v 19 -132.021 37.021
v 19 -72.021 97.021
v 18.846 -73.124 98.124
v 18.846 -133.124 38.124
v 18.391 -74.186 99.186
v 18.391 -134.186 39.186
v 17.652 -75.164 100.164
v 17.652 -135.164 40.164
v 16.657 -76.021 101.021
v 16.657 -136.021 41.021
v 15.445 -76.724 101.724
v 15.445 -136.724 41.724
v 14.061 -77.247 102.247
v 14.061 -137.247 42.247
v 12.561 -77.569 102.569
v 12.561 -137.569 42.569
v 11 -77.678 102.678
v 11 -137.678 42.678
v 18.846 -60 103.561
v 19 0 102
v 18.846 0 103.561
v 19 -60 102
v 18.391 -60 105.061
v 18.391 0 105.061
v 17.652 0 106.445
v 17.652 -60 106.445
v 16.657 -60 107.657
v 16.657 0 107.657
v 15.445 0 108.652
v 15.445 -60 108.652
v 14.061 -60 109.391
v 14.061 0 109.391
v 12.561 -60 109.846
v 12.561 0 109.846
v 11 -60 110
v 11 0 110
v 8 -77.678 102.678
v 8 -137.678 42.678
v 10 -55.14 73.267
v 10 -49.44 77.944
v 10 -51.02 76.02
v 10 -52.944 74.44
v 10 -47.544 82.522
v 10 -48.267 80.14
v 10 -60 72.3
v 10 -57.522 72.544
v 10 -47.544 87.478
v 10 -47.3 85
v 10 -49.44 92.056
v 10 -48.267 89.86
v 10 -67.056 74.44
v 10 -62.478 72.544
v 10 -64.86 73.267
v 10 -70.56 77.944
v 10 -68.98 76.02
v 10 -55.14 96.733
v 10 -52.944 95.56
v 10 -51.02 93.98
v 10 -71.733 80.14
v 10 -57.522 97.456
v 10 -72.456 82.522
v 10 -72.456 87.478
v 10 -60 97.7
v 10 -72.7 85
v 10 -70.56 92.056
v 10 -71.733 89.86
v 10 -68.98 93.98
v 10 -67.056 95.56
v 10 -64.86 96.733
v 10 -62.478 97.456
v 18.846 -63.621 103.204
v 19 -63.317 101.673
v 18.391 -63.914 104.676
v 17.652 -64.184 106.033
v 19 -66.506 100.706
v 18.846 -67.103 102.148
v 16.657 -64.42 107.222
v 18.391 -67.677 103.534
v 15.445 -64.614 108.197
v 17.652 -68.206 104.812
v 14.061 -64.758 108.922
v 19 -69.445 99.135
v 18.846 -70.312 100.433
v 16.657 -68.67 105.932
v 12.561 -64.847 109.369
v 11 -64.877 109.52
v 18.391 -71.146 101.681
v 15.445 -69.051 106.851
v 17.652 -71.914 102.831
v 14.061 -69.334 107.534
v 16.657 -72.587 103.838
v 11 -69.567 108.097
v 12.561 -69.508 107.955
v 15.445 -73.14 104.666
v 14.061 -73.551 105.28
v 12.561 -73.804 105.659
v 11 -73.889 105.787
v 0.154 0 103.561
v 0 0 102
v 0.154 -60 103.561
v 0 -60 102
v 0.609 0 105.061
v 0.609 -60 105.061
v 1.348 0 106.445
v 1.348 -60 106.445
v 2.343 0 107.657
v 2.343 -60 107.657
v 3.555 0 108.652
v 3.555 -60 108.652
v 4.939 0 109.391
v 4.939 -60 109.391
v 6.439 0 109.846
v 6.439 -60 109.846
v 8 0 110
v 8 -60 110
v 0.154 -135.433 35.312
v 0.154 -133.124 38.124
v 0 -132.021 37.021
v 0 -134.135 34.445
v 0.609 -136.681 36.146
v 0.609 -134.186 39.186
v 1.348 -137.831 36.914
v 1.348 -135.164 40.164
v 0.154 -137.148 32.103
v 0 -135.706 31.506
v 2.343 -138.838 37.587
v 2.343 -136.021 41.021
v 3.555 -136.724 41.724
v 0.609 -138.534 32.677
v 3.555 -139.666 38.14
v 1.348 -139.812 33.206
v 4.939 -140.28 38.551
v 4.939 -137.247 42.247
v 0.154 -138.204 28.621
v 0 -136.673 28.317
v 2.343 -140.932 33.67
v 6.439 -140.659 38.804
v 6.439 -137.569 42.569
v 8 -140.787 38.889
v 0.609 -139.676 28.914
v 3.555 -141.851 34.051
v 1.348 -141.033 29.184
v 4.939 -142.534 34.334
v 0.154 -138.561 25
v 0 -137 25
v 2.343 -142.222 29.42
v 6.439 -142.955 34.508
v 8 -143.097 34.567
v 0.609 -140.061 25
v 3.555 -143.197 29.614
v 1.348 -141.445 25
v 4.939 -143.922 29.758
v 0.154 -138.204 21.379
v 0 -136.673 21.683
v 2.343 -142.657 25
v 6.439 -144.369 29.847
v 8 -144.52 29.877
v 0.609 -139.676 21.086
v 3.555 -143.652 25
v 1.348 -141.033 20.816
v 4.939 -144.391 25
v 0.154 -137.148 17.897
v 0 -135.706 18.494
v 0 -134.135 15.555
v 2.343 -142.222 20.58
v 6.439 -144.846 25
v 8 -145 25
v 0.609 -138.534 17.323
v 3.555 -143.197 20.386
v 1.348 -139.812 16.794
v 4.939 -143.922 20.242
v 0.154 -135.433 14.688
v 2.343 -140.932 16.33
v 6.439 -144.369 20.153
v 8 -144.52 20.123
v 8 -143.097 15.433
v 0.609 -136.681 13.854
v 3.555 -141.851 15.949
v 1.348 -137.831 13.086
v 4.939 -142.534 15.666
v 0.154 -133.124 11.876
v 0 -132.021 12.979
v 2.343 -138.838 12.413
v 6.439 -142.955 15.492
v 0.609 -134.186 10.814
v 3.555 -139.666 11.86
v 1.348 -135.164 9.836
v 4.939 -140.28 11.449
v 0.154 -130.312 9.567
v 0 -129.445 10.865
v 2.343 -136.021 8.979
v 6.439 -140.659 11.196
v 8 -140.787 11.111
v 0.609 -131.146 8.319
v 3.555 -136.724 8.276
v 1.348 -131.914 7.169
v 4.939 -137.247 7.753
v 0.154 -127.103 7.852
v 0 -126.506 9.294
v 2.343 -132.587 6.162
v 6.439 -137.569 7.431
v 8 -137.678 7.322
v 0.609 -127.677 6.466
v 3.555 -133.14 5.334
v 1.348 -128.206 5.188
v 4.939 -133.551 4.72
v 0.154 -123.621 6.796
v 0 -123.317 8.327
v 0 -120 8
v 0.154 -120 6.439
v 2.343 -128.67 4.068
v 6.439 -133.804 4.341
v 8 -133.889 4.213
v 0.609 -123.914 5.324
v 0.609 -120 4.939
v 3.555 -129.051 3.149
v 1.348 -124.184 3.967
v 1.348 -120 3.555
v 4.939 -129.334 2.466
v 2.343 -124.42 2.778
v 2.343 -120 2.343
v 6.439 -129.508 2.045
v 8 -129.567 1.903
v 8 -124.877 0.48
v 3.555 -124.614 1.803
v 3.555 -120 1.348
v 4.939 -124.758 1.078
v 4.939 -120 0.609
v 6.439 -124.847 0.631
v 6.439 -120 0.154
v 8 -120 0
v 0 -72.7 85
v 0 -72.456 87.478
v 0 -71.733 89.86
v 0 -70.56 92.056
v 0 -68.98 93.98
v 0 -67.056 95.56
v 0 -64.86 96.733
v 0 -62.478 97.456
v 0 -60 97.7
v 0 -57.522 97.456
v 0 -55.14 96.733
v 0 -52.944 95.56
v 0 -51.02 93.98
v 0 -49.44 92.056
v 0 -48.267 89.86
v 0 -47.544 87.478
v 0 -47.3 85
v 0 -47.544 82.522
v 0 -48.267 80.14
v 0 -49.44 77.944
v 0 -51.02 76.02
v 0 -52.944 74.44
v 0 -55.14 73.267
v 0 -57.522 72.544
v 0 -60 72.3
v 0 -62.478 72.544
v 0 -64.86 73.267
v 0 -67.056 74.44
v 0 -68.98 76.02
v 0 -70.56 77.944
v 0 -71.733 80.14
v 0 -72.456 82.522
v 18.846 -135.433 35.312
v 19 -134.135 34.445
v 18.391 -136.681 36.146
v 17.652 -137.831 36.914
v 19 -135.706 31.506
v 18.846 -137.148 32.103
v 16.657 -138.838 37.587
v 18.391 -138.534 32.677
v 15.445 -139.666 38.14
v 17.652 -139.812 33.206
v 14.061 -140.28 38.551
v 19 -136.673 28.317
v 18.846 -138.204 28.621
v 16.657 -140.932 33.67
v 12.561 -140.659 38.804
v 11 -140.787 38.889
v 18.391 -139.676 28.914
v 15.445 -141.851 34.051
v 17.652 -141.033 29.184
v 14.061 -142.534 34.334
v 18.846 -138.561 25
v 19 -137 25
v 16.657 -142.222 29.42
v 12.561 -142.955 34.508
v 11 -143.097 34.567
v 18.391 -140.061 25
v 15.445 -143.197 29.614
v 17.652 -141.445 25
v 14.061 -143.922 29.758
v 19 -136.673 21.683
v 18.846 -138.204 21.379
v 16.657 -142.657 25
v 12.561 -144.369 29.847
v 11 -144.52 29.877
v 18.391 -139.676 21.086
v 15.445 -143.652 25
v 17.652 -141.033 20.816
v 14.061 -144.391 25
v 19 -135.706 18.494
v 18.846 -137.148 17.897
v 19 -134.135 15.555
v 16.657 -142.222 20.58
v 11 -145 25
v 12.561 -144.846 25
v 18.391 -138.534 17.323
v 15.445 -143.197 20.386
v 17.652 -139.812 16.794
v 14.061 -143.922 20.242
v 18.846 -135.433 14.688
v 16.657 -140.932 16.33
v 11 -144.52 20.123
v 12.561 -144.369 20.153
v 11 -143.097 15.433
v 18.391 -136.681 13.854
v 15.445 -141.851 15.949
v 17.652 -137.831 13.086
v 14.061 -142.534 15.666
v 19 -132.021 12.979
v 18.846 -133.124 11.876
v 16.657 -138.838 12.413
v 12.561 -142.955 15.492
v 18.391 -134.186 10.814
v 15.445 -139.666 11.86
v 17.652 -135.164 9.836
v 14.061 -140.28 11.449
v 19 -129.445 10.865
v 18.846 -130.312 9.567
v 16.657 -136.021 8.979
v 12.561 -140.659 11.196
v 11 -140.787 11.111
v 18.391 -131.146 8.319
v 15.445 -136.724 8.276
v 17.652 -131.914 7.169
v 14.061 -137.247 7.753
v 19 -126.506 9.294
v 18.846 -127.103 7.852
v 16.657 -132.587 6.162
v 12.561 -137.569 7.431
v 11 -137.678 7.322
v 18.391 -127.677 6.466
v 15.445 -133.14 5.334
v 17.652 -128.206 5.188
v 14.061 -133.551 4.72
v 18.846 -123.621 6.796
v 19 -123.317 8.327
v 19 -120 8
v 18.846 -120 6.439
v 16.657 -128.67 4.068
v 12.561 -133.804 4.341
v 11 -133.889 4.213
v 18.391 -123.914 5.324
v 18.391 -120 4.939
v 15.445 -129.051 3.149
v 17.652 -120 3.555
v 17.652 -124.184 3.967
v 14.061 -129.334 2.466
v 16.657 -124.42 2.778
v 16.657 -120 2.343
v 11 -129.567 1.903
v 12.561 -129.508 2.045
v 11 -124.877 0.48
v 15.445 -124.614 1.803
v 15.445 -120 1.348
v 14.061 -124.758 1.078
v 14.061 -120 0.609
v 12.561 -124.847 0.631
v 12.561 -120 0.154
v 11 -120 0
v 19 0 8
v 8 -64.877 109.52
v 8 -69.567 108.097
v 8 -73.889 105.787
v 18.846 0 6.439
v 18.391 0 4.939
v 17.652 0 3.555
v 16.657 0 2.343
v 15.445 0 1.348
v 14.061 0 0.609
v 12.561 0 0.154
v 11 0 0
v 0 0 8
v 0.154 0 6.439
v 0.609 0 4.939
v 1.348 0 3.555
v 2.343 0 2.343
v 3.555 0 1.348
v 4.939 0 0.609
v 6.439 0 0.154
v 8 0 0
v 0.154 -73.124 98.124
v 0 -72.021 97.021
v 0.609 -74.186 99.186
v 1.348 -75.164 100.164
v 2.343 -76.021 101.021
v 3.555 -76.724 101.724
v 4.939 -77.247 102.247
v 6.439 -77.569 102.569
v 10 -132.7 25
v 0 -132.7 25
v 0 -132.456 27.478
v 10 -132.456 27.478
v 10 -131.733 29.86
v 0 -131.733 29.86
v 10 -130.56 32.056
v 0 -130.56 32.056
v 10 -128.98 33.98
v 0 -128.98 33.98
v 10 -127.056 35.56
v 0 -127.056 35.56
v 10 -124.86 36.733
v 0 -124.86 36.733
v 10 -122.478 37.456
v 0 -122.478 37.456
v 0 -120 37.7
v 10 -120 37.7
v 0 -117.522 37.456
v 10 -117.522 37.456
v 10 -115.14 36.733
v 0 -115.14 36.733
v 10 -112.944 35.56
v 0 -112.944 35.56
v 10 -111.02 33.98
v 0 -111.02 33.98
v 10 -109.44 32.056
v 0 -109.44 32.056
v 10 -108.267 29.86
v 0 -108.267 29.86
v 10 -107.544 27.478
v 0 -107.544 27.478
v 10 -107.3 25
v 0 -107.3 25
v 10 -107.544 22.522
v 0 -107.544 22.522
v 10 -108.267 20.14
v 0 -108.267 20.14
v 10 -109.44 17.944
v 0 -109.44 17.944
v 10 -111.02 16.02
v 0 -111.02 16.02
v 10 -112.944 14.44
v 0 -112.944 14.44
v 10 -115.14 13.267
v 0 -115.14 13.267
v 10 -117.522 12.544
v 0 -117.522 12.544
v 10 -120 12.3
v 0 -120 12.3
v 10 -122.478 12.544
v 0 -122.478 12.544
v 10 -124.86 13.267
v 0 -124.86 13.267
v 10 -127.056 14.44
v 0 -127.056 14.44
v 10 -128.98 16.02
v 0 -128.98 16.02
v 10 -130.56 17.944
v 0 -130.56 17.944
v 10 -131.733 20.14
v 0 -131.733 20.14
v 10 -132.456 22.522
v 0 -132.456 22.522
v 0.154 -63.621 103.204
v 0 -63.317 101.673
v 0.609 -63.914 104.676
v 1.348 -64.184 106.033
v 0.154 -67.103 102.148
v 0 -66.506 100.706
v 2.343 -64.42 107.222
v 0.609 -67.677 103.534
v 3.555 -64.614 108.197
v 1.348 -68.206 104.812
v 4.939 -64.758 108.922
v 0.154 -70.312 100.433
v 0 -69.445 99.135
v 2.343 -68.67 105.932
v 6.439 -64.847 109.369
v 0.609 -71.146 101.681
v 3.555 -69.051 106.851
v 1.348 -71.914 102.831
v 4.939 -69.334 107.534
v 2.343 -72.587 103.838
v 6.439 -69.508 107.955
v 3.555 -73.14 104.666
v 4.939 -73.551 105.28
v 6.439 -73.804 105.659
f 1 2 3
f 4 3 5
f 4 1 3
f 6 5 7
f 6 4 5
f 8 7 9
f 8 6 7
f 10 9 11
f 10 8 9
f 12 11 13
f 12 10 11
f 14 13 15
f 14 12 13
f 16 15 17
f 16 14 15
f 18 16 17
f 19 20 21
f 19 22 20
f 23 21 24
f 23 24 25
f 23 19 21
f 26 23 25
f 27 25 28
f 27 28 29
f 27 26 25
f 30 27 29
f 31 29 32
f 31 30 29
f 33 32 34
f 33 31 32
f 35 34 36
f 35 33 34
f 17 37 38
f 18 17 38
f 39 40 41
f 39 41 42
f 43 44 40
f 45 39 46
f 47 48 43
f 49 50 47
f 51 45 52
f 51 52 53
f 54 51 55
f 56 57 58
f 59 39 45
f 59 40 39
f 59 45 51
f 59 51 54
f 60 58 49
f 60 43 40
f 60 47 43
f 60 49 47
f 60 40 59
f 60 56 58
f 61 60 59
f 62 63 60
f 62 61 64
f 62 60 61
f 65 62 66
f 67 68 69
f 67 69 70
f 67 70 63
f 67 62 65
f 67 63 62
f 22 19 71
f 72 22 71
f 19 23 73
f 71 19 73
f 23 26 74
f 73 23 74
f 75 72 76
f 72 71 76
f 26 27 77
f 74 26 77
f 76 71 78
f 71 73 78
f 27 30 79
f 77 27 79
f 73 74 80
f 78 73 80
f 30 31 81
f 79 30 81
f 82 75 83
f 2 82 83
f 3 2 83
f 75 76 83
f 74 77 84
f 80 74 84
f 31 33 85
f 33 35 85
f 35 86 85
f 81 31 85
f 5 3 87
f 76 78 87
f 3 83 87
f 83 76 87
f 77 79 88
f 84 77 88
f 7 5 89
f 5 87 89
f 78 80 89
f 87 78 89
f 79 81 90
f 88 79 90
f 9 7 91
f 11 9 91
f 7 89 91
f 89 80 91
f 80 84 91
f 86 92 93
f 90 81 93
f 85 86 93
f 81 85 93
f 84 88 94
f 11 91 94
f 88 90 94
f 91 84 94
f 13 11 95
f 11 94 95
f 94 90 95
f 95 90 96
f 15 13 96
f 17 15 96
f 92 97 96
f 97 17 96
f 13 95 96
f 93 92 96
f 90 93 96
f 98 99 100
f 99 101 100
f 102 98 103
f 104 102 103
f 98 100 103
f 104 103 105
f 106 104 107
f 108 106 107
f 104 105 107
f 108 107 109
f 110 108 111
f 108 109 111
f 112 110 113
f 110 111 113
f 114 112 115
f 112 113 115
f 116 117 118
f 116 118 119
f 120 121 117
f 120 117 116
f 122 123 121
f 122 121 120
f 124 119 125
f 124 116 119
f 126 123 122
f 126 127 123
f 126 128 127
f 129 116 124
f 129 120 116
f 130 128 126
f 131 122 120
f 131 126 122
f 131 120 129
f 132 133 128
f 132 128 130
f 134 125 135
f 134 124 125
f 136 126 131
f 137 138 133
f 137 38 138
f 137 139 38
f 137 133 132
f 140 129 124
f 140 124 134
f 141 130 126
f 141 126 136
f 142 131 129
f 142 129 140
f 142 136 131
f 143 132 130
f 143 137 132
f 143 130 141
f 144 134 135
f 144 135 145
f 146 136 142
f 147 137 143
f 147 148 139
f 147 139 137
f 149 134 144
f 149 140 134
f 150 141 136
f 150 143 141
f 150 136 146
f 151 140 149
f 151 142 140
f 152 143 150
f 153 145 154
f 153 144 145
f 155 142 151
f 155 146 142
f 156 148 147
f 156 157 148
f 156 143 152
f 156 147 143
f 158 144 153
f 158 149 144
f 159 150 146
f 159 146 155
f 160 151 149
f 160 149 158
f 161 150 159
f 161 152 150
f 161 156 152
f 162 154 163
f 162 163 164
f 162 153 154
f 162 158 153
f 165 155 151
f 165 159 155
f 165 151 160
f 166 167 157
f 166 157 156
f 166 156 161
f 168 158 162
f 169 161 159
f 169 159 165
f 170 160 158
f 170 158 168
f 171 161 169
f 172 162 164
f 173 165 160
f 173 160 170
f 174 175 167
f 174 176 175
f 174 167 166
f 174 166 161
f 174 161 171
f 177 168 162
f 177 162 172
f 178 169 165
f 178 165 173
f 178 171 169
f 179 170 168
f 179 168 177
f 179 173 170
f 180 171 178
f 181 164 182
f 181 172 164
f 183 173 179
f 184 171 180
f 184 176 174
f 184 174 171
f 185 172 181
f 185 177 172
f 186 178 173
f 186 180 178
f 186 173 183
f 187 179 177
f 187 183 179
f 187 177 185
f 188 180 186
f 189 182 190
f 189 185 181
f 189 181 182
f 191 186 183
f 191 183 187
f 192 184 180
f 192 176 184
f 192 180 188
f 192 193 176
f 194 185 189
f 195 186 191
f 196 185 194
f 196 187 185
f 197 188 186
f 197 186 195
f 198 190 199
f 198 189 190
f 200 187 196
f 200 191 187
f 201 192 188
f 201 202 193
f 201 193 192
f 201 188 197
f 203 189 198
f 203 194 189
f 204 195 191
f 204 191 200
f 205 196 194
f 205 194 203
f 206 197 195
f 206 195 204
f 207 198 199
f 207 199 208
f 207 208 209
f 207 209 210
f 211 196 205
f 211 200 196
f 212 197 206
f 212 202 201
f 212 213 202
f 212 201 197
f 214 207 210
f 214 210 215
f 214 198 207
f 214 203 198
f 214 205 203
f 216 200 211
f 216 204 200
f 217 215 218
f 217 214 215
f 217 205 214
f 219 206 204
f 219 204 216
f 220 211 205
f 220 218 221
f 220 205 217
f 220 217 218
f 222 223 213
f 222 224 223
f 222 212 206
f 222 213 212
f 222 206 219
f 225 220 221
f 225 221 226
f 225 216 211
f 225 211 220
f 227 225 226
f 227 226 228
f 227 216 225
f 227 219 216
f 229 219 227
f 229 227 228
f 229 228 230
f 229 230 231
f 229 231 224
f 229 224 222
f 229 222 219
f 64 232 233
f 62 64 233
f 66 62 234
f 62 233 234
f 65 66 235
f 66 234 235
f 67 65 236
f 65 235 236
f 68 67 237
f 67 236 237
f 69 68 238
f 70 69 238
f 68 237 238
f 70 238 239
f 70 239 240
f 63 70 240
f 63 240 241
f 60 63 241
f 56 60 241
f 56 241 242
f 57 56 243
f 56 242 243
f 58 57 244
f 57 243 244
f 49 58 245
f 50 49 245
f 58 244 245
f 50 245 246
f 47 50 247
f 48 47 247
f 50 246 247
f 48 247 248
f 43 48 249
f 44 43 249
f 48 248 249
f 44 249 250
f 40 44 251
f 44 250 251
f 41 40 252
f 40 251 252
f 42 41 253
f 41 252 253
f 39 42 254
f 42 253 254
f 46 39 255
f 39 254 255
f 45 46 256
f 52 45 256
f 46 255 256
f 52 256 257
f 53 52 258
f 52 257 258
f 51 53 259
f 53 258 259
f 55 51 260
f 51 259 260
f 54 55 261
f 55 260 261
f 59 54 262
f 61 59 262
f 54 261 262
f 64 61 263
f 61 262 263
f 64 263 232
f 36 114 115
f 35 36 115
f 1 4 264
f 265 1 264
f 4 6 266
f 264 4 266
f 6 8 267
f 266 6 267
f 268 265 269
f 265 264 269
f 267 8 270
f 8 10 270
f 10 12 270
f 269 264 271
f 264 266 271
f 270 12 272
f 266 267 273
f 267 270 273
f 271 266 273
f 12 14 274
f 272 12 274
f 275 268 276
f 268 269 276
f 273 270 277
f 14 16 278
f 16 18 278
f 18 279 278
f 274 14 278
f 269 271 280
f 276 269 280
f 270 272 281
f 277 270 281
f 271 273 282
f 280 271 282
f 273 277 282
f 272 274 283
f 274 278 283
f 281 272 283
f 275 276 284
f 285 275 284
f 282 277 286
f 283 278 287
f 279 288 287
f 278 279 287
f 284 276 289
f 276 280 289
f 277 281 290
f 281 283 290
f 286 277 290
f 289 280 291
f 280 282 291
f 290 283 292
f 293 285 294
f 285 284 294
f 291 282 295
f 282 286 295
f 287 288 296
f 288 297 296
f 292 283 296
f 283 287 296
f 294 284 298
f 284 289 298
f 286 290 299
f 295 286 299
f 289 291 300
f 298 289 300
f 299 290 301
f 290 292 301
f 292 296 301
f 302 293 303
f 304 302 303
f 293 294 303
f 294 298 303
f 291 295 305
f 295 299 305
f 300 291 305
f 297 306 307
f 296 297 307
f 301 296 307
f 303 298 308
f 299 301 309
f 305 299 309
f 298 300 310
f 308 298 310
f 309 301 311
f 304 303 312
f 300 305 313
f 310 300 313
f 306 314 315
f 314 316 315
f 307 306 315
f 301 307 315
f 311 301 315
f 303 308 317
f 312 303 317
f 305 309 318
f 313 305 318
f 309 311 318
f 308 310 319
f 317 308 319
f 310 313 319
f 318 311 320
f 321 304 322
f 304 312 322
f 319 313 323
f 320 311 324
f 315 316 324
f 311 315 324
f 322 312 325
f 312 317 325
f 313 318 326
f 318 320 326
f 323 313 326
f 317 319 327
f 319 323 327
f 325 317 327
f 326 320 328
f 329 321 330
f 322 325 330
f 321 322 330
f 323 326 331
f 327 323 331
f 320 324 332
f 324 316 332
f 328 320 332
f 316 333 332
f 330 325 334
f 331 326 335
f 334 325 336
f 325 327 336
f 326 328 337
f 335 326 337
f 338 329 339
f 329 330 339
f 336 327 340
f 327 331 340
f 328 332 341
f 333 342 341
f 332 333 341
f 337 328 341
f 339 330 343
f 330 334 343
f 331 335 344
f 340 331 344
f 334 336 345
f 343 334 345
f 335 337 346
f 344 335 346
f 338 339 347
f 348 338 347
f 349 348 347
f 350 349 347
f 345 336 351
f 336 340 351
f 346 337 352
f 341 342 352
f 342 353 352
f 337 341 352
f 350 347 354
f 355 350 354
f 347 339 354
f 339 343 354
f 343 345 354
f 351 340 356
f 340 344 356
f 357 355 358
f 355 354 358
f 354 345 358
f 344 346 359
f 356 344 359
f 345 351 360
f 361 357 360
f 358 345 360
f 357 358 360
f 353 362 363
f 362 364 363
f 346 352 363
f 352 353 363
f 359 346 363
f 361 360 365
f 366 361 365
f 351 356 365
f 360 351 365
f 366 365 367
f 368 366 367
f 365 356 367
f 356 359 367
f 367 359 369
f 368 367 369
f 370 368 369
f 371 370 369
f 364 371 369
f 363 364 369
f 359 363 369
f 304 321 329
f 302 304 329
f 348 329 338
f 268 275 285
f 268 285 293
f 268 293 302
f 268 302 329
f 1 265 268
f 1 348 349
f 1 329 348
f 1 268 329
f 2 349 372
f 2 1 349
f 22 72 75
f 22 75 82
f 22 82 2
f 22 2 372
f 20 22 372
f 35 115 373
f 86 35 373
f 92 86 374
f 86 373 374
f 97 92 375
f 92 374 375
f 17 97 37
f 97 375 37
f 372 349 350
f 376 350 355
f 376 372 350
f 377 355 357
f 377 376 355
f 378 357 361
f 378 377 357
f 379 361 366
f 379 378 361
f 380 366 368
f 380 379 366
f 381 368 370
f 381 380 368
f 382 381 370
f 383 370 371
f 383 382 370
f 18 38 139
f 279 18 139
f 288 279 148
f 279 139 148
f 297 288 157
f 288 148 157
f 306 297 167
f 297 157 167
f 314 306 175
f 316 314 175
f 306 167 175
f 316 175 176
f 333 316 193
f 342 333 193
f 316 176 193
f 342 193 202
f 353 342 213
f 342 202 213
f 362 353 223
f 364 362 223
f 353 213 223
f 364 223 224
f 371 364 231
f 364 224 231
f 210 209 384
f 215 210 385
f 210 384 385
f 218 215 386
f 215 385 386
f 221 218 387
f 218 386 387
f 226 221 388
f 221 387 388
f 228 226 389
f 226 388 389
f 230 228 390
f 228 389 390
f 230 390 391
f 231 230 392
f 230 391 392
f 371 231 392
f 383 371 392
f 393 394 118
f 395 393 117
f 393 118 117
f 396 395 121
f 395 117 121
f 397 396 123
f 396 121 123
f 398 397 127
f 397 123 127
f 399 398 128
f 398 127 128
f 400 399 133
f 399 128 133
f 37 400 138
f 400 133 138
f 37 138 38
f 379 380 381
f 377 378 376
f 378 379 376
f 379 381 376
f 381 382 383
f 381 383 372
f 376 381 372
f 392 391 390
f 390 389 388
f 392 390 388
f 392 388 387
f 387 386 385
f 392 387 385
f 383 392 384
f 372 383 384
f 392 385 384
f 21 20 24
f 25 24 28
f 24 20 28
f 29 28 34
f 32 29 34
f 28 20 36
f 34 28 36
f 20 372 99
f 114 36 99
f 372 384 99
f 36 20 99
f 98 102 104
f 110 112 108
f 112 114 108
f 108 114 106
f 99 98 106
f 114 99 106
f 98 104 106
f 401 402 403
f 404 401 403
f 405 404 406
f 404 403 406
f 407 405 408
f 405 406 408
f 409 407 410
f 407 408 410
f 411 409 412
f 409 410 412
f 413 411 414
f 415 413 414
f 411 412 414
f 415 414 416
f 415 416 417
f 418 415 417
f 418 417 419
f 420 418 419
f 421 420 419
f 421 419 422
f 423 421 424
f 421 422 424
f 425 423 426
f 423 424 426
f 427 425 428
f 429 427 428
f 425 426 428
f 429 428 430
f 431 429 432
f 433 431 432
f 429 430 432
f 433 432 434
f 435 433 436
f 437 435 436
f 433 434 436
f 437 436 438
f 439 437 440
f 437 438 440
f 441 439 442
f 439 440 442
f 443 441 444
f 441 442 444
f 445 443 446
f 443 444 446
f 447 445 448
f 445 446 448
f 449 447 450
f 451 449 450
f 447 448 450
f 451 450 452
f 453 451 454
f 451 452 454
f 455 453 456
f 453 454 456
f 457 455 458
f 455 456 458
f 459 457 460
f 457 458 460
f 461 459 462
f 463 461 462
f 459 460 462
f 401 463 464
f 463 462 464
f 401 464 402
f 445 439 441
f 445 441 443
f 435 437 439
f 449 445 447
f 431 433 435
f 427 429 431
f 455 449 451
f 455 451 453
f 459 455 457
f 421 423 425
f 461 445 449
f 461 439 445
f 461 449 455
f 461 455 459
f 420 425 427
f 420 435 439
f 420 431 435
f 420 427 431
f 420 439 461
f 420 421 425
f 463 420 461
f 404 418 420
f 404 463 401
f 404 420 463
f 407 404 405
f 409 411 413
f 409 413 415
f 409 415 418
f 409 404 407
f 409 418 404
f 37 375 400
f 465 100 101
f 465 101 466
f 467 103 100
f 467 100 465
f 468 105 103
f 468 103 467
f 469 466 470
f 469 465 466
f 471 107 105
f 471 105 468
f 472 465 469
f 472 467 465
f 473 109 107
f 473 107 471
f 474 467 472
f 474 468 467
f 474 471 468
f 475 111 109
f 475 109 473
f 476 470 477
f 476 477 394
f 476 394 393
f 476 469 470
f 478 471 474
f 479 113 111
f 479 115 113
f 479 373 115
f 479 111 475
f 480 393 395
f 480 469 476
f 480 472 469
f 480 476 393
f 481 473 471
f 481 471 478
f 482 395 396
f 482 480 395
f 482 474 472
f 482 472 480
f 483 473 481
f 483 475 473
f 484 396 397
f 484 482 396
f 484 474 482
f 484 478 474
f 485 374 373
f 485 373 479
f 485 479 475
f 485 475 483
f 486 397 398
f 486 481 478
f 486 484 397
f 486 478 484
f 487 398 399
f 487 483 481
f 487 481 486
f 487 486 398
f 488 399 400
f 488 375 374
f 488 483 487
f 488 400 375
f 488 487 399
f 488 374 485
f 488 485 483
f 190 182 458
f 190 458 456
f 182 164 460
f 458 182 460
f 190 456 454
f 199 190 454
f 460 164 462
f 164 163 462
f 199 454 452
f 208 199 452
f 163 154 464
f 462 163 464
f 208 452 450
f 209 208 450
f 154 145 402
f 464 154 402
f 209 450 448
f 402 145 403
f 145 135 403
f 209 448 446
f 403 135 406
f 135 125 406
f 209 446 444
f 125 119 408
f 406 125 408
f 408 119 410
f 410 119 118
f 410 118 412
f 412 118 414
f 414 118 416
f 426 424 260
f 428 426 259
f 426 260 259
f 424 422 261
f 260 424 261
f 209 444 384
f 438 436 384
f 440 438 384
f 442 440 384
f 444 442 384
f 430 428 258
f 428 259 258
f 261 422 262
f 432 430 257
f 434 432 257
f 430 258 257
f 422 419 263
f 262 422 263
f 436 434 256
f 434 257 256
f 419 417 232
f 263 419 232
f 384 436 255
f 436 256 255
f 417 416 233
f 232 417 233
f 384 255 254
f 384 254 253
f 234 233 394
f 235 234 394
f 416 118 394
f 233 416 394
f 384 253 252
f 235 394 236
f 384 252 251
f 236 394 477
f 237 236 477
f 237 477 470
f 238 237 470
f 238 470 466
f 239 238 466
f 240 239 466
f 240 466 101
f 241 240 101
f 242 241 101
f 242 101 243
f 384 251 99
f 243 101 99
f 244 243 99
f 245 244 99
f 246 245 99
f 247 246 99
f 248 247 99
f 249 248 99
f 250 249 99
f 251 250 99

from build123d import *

# Parameters (mm, degrees)
F1_DEPTH = 19
F2_R     = 12.7
F3_DEPTH = 10
F4_R     = 8
F5_R     = 8


with BuildPart() as f1:
    # F0 (on Right) → F1 (new body)
    with BuildSketch(Plane.YZ):
        with BuildLine():
            Line((-120, 0), (0, 0))
            Line((0, 0), (0, 110))
            Line((0, 110), (-60, 110))
            ThreePointArc((-60, 110), (-69.567086, 108.096988), (-77.67767, 102.67767))
            Line((-77.67767, 102.67767), (-137.67767, 42.67767))
            ThreePointArc((-137.67767, 42.67767), (-143.096988, 15.432914), (-120, 0))
        make_face()
    extrude(amount=F1_DEPTH)

    # F2 (on face) → F3 (cut)
    with BuildSketch(Plane(origin=(0, 0, 0), x_dir=(0, -1, 0), z_dir=(-1, 0, 0))):
        with Locations((60, 85)):
            Circle(F2_R)
        with Locations((120, 25)):
            Circle(F2_R)
    extrude(amount=-F3_DEPTH, mode=Mode.SUBTRACT)

    # F4
    f4_edges = [f1.edges().sort_by_distance(p)[0] for p in [
        (0, -30, 110),
    ]]
    fillet(f4_edges, radius=F4_R)

    # F5
    f5_edges = [f1.edges().sort_by_distance(p)[0] for p in [
        (19, -30, 110),
    ]]
    fillet(f5_edges, radius=F5_R)


solid = f1.part
